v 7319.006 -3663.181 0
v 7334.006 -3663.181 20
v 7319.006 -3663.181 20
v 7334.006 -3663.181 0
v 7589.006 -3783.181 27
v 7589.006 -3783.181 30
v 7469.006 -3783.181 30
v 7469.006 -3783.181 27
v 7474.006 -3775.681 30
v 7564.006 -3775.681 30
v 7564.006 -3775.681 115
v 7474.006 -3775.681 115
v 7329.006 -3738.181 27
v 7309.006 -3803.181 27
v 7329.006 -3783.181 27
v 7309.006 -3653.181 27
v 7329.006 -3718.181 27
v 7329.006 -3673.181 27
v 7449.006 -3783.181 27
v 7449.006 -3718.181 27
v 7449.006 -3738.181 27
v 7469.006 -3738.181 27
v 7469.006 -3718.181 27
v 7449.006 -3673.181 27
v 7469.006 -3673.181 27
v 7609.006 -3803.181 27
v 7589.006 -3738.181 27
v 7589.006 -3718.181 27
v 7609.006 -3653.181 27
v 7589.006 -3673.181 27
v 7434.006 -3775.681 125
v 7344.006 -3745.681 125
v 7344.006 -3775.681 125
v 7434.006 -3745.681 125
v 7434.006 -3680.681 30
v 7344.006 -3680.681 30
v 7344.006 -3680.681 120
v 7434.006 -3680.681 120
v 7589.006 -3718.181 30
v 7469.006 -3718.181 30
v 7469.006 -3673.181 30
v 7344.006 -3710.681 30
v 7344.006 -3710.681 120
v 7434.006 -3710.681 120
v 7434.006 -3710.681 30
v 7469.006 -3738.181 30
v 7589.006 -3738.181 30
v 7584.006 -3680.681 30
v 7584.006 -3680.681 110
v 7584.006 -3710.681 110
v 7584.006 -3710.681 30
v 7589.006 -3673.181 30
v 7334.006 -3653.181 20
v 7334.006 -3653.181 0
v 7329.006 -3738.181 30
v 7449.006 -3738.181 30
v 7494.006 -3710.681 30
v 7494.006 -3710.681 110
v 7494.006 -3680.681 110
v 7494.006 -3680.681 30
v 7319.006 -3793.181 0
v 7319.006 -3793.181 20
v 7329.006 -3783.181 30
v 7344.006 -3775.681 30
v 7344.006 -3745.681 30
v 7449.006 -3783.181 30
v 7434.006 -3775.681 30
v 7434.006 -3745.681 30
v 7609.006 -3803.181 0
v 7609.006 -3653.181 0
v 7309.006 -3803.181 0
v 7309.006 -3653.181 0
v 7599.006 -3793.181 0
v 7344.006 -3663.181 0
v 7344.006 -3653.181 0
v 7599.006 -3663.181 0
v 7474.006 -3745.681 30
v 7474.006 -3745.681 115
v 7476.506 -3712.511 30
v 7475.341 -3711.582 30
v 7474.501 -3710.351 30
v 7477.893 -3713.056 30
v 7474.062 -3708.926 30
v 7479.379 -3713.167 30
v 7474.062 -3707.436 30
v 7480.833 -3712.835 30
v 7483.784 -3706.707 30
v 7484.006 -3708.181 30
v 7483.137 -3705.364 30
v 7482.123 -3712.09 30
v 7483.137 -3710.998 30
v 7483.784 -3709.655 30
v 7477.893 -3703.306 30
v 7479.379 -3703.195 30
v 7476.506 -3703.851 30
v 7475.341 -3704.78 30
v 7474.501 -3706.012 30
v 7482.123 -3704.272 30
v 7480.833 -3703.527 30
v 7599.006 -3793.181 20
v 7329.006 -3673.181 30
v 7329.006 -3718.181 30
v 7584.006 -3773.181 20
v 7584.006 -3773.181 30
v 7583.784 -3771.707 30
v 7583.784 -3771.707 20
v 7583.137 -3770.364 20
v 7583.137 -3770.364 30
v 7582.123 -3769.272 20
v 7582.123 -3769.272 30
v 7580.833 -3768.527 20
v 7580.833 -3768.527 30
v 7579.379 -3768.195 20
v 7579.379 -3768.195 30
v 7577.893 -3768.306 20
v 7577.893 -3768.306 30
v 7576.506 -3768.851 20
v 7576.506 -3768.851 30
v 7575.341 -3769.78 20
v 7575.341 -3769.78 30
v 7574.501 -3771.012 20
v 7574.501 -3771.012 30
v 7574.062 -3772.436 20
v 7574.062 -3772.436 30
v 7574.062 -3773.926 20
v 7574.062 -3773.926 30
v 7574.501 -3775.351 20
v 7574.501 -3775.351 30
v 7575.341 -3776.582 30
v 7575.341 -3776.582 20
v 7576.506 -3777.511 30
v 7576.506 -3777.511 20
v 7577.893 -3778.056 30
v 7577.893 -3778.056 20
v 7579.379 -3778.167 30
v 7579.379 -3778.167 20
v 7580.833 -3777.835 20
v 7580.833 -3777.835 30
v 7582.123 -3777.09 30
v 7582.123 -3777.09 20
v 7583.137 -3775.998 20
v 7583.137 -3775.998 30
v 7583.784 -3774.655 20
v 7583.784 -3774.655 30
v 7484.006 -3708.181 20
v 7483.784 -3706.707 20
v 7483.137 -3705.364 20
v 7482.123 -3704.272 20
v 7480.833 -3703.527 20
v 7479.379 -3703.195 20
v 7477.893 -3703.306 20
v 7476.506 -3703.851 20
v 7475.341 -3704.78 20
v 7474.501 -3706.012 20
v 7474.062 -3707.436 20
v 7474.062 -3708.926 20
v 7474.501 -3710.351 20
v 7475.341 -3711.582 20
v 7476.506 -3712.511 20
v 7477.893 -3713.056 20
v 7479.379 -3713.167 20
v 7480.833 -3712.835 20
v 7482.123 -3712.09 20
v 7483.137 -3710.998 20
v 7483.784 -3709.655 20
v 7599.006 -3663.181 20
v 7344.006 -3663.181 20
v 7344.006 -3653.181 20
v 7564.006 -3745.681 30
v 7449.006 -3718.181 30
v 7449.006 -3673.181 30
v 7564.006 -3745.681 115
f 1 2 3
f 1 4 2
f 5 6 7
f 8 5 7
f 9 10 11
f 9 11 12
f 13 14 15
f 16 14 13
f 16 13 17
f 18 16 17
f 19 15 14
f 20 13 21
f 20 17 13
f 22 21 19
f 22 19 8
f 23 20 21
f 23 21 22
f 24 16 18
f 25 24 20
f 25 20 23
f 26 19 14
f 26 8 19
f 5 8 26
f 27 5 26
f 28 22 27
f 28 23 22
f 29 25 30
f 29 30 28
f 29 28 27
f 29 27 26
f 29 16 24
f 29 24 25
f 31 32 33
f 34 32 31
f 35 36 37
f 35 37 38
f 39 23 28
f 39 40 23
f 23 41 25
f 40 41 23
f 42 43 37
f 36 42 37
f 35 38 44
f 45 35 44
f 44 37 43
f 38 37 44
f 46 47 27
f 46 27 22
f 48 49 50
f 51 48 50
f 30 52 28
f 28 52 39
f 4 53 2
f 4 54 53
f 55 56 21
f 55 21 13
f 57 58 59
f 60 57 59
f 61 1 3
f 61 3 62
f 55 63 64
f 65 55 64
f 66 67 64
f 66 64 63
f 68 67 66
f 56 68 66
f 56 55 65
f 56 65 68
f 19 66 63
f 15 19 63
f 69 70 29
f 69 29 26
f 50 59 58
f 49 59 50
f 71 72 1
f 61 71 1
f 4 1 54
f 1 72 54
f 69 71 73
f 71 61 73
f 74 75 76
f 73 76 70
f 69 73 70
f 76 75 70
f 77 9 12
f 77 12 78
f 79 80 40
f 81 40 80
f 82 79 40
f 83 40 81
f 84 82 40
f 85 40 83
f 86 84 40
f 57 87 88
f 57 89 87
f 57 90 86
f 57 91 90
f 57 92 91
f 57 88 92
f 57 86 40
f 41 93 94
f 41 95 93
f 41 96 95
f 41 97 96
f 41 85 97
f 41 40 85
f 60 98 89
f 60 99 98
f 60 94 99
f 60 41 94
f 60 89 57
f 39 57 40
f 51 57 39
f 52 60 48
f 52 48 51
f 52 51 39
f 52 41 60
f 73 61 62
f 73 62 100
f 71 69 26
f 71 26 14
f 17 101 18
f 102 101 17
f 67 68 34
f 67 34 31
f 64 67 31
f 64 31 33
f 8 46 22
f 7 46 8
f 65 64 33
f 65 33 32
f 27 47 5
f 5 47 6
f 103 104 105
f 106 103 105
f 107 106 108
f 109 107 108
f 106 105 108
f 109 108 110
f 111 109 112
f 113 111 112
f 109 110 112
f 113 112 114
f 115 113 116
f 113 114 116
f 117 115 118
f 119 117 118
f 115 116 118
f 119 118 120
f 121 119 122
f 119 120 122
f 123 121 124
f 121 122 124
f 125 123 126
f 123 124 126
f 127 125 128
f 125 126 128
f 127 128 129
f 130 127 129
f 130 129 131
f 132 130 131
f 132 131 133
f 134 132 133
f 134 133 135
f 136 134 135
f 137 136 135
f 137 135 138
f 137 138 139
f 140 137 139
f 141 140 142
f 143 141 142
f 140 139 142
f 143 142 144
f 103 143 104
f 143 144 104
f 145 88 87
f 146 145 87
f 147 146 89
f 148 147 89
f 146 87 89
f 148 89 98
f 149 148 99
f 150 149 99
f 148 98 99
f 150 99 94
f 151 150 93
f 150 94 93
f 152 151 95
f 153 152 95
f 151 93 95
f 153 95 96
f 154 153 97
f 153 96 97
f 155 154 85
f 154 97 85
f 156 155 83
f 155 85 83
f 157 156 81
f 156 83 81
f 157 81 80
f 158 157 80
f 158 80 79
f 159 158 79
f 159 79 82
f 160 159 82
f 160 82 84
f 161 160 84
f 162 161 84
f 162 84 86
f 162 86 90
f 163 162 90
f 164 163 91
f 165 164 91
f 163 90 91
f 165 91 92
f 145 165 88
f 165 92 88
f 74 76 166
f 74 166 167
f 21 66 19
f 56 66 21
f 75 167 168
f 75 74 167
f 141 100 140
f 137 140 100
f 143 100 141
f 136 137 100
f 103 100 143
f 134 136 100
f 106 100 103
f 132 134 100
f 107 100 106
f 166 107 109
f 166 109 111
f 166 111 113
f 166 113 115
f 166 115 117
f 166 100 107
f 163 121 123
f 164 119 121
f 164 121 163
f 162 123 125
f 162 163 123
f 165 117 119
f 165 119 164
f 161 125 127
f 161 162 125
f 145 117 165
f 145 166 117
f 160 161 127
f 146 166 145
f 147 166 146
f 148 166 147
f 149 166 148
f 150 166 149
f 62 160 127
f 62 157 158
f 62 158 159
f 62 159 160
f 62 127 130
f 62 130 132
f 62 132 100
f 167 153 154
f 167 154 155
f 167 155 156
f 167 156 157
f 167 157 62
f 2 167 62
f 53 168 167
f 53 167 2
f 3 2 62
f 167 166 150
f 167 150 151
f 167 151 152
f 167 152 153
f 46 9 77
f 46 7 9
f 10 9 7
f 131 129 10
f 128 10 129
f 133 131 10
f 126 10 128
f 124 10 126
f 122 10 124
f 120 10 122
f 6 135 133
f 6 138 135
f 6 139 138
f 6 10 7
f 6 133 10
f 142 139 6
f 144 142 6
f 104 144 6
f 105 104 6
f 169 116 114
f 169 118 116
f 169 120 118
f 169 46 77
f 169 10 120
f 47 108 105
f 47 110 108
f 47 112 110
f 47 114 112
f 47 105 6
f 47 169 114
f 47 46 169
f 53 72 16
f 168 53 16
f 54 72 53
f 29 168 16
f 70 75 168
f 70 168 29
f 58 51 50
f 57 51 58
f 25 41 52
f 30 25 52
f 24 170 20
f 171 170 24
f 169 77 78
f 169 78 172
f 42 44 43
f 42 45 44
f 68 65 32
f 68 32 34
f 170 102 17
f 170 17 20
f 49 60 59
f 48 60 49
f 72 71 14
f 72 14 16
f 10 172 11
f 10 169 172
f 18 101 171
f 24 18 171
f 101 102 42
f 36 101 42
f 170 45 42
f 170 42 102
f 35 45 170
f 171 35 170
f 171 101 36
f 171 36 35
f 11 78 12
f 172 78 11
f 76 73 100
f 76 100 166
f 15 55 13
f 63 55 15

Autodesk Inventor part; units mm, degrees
ref_plane "YZ Plane" through (0, 0, 0) normal (1, 0, 0) x (0, 1, 0)
ref_plane "XZ Plane" through (0, 0, 0) normal (0, 1, 0) x (-1, 0, 0)
ref_plane "XY Plane" through (0, 0, 0) normal (0, 0, 1) x (1, 0, 0)
sketch "Skizze1" plane through (0, 0, 0) normal (0, 0, 1) x (1, 0, 0)
  line L0 (7309.0058, -3653.1811) -> (7609.0058, -3653.1811)
  line L1 (7609.0058, -3653.1811) -> (7609.0058, -3803.1811)
  line L2 (7609.0058, -3803.1811) -> (7309.0058, -3803.1811)
  line L3 (7309.0058, -3803.1811) -> (7309.0058, -3653.1811)
  point P0 (0, 0)
  dimension "d0" = 300
  dimension "d1" = 150
extrude "Extrusion1" add sketch "Skizze1" along normal blind 30
sketch "Skizze2" plane through (0, 0, 30) normal (0, 0, 1) x (1, 0, 0)
  line L0 (7309.0058, -3653.1811) -> (7309.0058, -3803.1811) projected
  line L1 (7609.0058, -3803.1811) -> (7609.0058, -3653.1811) projected
  line L2 (7309.0058, -3718.1811) -> (7609.0058, -3718.1811)
  line L3 (7609.0058, -3718.1811) -> (7609.0058, -3738.1811)
  line L4 (7609.0058, -3738.1811) -> (7309.0058, -3738.1811)
  line L5 (7309.0058, -3738.1811) -> (7309.0058, -3718.1811)
  line L6 (7609.0058, -3653.1811) -> (7309.0058, -3653.1811) projected
  point P0 (0, 0)
  dimension "d4" = 20
  dimension "d5" = 65
extrude "Extrusion2" cut sketch "Skizze2" against normal blind 3 contours L2 L1 L4 L0
sketch "Skizze3" plane through (0, 0, 30) normal (0, 0, 1) x (1, 0, 0)
  line L0 (7609.0058, -3653.1811) -> (7309.0058, -3653.1811) projected
  line L1 (7309.0058, -3803.1811) -> (7609.0058, -3803.1811) projected
  line L2 (7449.0058, -3653.1811) -> (7469.0058, -3653.1811)
  line L3 (7469.0058, -3653.1811) -> (7469.0058, -3803.1811)
  line L4 (7469.0058, -3803.1811) -> (7449.0058, -3803.1811)
  line L5 (7449.0058, -3803.1811) -> (7449.0058, -3653.1811)
  line L6 (7309.0058, -3653.1811) -> (7309.0058, -3718.1811) projected
  point P0 (0, 0)
  dimension "d8" = 20
  dimension "d9" = 140
extrude "Extrusion3" cut sketch "Skizze3" against normal blind 3
sketch "Skizze4" plane through (0, 0, 30) normal (0, 0, 1) x (1, 0, 0)
  line L0 (7609.0058, -3653.1811) -> (7309.0058, -3653.1811) projected
  line L1 (7309.0058, -3803.1811) -> (7609.0058, -3803.1811) projected
  line L2 (7609.0058, -3653.1811) -> (7589.0058, -3653.1811)
  line L3 (7589.0058, -3653.1811) -> (7589.0058, -3803.1811)
  line L4 (7589.0058, -3803.1811) -> (7609.0058, -3803.1811)
  line L5 (7609.0058, -3803.1811) -> (7609.0058, -3653.1811)
  line L6 (7309.0058, -3653.1811) -> (7329.0058, -3653.1811)
  line L7 (7329.0058, -3653.1811) -> (7329.0058, -3803.1811)
  line L8 (7329.0058, -3803.1811) -> (7309.0058, -3803.1811)
  line L9 (7309.0058, -3803.1811) -> (7309.0058, -3653.1811)
  line L10 (7309.0058, -3803.1811) -> (7609.0058, -3803.1811)
  line L11 (7609.0058, -3803.1811) -> (7609.0058, -3783.1811)
  line L12 (7609.0058, -3783.1811) -> (7309.0058, -3783.1811)
  line L13 (7309.0058, -3783.1811) -> (7309.0058, -3803.1811)
  line L14 (7609.0058, -3653.1811) -> (7309.0058, -3653.1811)
  line L15 (7309.0058, -3653.1811) -> (7309.0058, -3673.1811)
  line L16 (7309.0058, -3673.1811) -> (7609.0058, -3673.1811)
  line L17 (7609.0058, -3673.1811) -> (7609.0058, -3653.1811)
  point P0 (0, 0)
  point P1 (7589.0058, -3783.1811)
  point P2 (7329.0058, -3783.1811)
  point P3 (7329.0058, -3673.1811)
  point P4 (7589.0058, -3673.1811)
  dimension "d12" = 20
  dimension "d13" = 20
  dimension "d14" = 20
  dimension "d15" = 20
extrude "Extrusion4" cut sketch "Skizze4" against normal blind 3 contours L5 L16 L3 L0 | L3 L16 L7 L0 | L5 L12 L3 L16 | L7 L16 L9 L0 | L5 L1 L3 L12 | L7 L12 L9 L16 | L3 L1 L7 L12 | L7 L1 L9 L12
sketch "Skizze5" plane through (0, 0, 30) normal (0, 0, 1) x (1, 0, 0)
  line L0 (7344.0058, -3680.6811) -> (7434.0058, -3680.6811)
  line L1 (7434.0058, -3680.6811) -> (7434.0058, -3710.6811)
  line L2 (7434.0058, -3710.6811) -> (7344.0058, -3710.6811)
  line L3 (7344.0058, -3710.6811) -> (7344.0058, -3680.6811)
  line L4 (7449.0058, -3673.1811) -> (7329.0058, -3673.1811) projected
  line L5 (7329.0058, -3673.1811) -> (7329.0058, -3718.1811) projected
  line L6 (7344.0058, -3745.6811) -> (7434.0058, -3745.6811)
  line L7 (7434.0058, -3745.6811) -> (7434.0058, -3775.6811)
  line L8 (7434.0058, -3775.6811) -> (7344.0058, -3775.6811)
  line L9 (7344.0058, -3775.6811) -> (7344.0058, -3745.6811)
  line L10 (7449.0058, -3738.1811) -> (7329.0058, -3738.1811) projected
  line L11 (7449.0058, -3783.1811) -> (7449.0058, -3738.1811) projected
  line L12 (7474.0058, -3745.6811) -> (7564.0058, -3745.6811)
  line L13 (7564.0058, -3745.6811) -> (7564.0058, -3775.6811)
  line L14 (7564.0058, -3775.6811) -> (7474.0058, -3775.6811)
  line L15 (7474.0058, -3775.6811) -> (7474.0058, -3745.6811)
  line L16 (7589.0058, -3738.1811) -> (7469.0058, -3738.1811) projected
  line L17 (7469.0058, -3738.1811) -> (7469.0058, -3783.1811) projected
  line L18 (7494.0058, -3680.6811) -> (7584.0058, -3680.6811)
  line L19 (7584.0058, -3680.6811) -> (7584.0058, -3710.6811)
  line L20 (7584.0058, -3710.6811) -> (7494.0058, -3710.6811)
  line L21 (7494.0058, -3710.6811) -> (7494.0058, -3680.6811)
  line L22 (7589.0058, -3673.1811) -> (7469.0058, -3673.1811) projected
  line L23 (7589.0058, -3718.1811) -> (7589.0058, -3673.1811) projected
  line L24 (7609.0058, -3803.1811) -> (7309.0058, -3803.1811) projected
  line L25 (7309.0058, -3803.1811) -> (7309.0058, -3653.1811) projected
  line L26 (7609.0058, -3653.1811) -> (7609.0058, -3803.1811) projected
  line L27 (7309.0058, -3653.1811) -> (7609.0058, -3653.1811) projected
  point P0 (0, 0)
  point P1 (7329.0058, -3695.6811)
  point P2 (7564.0058, -3760.6811)
  dimension "d18" = 90
  dimension "d19" = 30
  dimension "d20" = 7.5
  dimension "d21" = 15
  dimension "d22" = 90
  dimension "d23" = 30
  dimension "d24" = 7.5
  dimension "d25" = 15
  dimension "d26" = 90
  dimension "d27" = 30
  dimension "d28" = 7.5
  dimension "d29" = 5
  dimension "d30" = 90
  dimension "d31" = 30
  dimension "d32" = 7.5
  dimension "d33" = 5
  dimension "d58" = 27.5
  dimension "d59" = 35
  dimension "d60" = 35
  dimension "d61" = 45
  dimension "d62" = 27.5
  dimension "d63" = 25
  dimension "d64" = 27.5
extrude "Extrusion5" add sketch "Skizze5" along normal blind 90 contours L0 L1 L2 L3
extrude "Extrusion6" add sketch "Skizze5" along normal blind 80 contours L18 L19 L20 L21
extrude "Extrusion7" add sketch "Skizze5" along normal blind 95 contours L6 L7 L8 L9
extrude "Extrusion8" add sketch "Skizze5" along normal blind 85 contours L12 L13 L14 L15
sketch "Skizze6" plane through (0, 0, 0) normal (0, 0, -1) x (-1, 0, 0)
  line L0 (-7599.0058, -3663.1811) -> (-7319.0058, -3663.1811)
  line L1 (-7319.0058, -3663.1811) -> (-7319.0058, -3793.1811)
  line L2 (-7319.0058, -3793.1811) -> (-7599.0058, -3793.1811)
  line L3 (-7599.0058, -3793.1811) -> (-7599.0058, -3663.1811)
  line L4 (-7609.0058, -3653.1811) -> (-7309.0058, -3653.1811) projected
  line L5 (-7609.0058, -3803.1811) -> (-7609.0058, -3653.1811) projected
  line L6 (-7344.0058, -3653.1811) -> (-7334.0058, -3653.1811)
  line L7 (-7334.0058, -3653.1811) -> (-7334.0058, -3663.1811)
  line L8 (-7334.0058, -3663.1811) -> (-7344.0058, -3663.1811)
  line L9 (-7344.0058, -3663.1811) -> (-7344.0058, -3653.1811)
  line L10 (-7309.0058, -3653.1811) -> (-7309.0058, -3803.1811) projected
  point P0 (0, 0)
  point P1 (-7334.0058, -3658.1811)
  dimension "d42" = 280
  dimension "d43" = 130
  dimension "d44" = 10
  dimension "d45" = 10
  dimension "d46" = 10
  dimension "d47" = 25
extrude "Extrusion9" cut sketch "Skizze6" against normal blind 20
sketch "Skizze7" plane through (0, 0, 30) normal (0, 0, 1) x (1, 0, 0)
  circle A0 centre (7479.0058, -3708.1811) radius 5
  circle A1 centre (7579.0058, -3773.1811) radius 5
  line L0 (7469.0058, -3673.1811) -> (7469.0058, -3718.1811) projected
  line L1 (7469.0058, -3718.1811) -> (7589.0058, -3718.1811) projected
  line L2 (7589.0058, -3783.1811) -> (7589.0058, -3738.1811) projected
  line L3 (7469.0058, -3783.1811) -> (7589.0058, -3783.1811) projected
  point P0 (0, 0)
  dimension "d50" = 10
  dimension "d51" = 10
  dimension "d52" = 10
  dimension "d53" = 10
  dimension "d54" = 10
  dimension "d55" = 10
extrude "Extrusion10" cut sketch "Skizze7" against normal through all
sketch "Skizze8" plane through (0, 0, 20) normal (0, 0, -1) x (-1, 0, 0)
  line L0 (-7349.0058, -3685.6811) -> (-7429.0058, -3685.6811)
  line L1 (-7429.0058, -3685.6811) -> (-7429.0058, -3705.6811)
  line L2 (-7429.0058, -3705.6811) -> (-7349.0058, -3705.6811)
  line L3 (-7349.0058, -3705.6811) -> (-7349.0058, -3685.6811)
  line L4 (-7609.0058, -3653.1811) -> (-7344.0058, -3653.1811) projected
  line L5 (-7309.0058, -3653.1811) -> (-7309.0058, -3803.1811) projected
  line L6 (-7349.0058, -3770.6811) -> (-7429.0058, -3770.6811)
  line L7 (-7429.0058, -3770.6811) -> (-7429.0058, -3750.6811)
  line L8 (-7429.0058, -3750.6811) -> (-7349.0058, -3750.6811)
  line L9 (-7349.0058, -3750.6811) -> (-7349.0058, -3770.6811)
  line L10 (-7309.0058, -3803.1811) -> (-7609.0058, -3803.1811) projected
  line L11 (-7559.0058, -3770.6811) -> (-7479.0058, -3770.6811)
  line L12 (-7479.0058, -3770.6811) -> (-7479.0058, -3750.6811)
  line L13 (-7479.0058, -3750.6811) -> (-7559.0058, -3750.6811)
  line L14 (-7559.0058, -3750.6811) -> (-7559.0058, -3770.6811)
  line L15 (-7609.0058, -3803.1811) -> (-7609.0058, -3653.1811) projected
  line L16 (-7499.0058, -3705.6811) -> (-7579.0058, -3705.6811)
  line L17 (-7579.0058, -3705.6811) -> (-7579.0058, -3685.6811)
  line L18 (-7579.0058, -3685.6811) -> (-7499.0058, -3685.6811)
  line L19 (-7499.0058, -3685.6811) -> (-7499.0058, -3705.6811)
  point P0 (0, 0)
  dimension "d65" = 80
  dimension "d66" = 20
  dimension "d67" = 32.5
  dimension "d68" = 40
  dimension "d69" = 80
  dimension "d70" = 20
  dimension "d71" = 40
  dimension "d72" = 32.5
  dimension "d73" = 80
  dimension "d74" = 50
  dimension "d75" = 32.5
  dimension "d76" = 80
  dimension "d77" = 20
  dimension "d78" = 32.5
  dimension "d79" = 30
extrude "Extrusion11" add sketch "Skizze8" against normal blind 70
properties part number "2"
